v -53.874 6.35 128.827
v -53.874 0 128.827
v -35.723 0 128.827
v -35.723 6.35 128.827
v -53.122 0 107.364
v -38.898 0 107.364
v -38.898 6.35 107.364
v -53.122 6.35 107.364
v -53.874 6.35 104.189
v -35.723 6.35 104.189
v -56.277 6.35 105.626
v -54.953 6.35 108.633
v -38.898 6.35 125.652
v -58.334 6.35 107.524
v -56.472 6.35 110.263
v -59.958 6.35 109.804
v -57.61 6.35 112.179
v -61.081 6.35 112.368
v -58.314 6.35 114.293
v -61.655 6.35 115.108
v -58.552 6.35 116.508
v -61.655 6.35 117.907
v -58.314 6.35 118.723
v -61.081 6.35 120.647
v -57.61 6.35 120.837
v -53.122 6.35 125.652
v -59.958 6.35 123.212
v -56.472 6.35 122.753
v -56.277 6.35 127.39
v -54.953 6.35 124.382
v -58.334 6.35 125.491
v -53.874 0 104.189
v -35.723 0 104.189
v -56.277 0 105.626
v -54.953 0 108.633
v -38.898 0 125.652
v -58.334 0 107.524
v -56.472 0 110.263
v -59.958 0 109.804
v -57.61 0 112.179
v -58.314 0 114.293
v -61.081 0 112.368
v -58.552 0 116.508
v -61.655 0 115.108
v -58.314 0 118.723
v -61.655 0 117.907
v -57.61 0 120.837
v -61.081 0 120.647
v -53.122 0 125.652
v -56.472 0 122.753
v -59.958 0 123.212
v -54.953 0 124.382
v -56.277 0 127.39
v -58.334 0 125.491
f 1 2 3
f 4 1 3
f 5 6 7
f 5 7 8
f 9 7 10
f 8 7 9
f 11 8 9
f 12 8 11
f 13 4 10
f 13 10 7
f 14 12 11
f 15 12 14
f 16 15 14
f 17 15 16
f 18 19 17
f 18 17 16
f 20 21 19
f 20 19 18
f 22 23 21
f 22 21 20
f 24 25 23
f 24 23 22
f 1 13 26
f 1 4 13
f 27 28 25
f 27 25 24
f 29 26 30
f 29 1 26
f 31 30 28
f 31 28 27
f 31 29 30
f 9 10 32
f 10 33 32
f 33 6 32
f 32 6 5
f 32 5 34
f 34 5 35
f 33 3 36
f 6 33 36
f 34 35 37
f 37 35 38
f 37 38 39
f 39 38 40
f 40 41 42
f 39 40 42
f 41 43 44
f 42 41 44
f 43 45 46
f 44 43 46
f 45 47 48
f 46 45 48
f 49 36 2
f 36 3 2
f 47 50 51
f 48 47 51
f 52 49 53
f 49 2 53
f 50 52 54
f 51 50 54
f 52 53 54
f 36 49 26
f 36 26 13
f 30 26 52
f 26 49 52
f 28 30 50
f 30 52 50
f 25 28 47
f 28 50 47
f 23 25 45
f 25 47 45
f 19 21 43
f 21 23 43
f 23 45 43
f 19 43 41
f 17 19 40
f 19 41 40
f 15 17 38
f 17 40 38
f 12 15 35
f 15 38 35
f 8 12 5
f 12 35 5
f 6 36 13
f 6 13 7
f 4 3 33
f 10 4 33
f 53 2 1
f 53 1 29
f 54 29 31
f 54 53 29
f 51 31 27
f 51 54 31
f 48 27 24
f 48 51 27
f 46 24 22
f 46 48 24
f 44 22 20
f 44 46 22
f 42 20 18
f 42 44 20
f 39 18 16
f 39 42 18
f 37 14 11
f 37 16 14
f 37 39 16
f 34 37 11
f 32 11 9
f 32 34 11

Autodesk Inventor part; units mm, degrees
ref_plane "YZ Plane" through (0, 0, 0) normal (1, 0, 0) x (0, 1, 0)
ref_plane "XZ Plane" through (0, 0, 0) normal (0, 1, 0) x (-1, 0, 0)
ref_plane "XY Plane" through (0, 0, 0) normal (0, 0, 1) x (1, 0, 0)
sketch "Sketch1" plane through (0, 0, 0) normal (0, 1, 0) x (-1, 0, 0)
  line L0 (53.122, 125.6518) -> (38.898, 125.6518)
  line L1 (38.898, 125.6518) -> (38.898, 107.3638)
  line L2 (38.898, 107.3638) -> (53.122, 107.3638)
  arc A0 (53.122, 107.3638) -> (53.122, 125.6518) centre (48.1382, 116.5078) ccw
  line L3 (51.0559, 55.1199) -> (37.0859, 55.1199)
  line L4 (37.0859, 55.1199) -> (37.0859, 37.0859)
  line L5 (37.0859, 37.0859) -> (51.0559, 37.0859)
  arc A1 (51.0559, 37.0859) -> (51.0559, 55.1199) centre (39.6314, 46.1029) ccw
  line L6 (61.7452, 17.3999) -> (47.7752, 17.3999)
  line L7 (47.7752, 17.3999) -> (47.7752, -0.6341)
  line L8 (47.7752, -0.6341) -> (61.7452, -0.6341)
  arc A2 (61.7452, -0.6341) -> (61.7452, 17.3999) centre (49.459, 8.3829) ccw
  line L9 (89.1373, 73.7746) -> (75.1673, 73.7746)
  line L10 (75.1673, 73.7746) -> (75.1673, 55.7406)
  line L11 (75.1673, 55.7406) -> (89.1373, 55.7406)
  arc A3 (89.1373, 55.7406) -> (89.1373, 73.7746) centre (83.9272, 64.7576) ccw
  line L12 (52.5031, 58.2949) -> (33.9109, 58.2949)
  line L13 (33.9109, 58.2949) -> (33.9109, 33.9109)
  line L14 (33.9109, 33.9109) -> (52.5031, 33.9109)
  arc A4 (52.5031, 33.9109) -> (52.5031, 58.2949) centre (39.6314, 46.1029) ccw
  line L15 (53.8743, 128.8268) -> (35.723, 128.8268)
  line L16 (35.723, 128.8268) -> (35.723, 104.1888)
  line L17 (35.723, 104.1888) -> (53.8743, 104.1888)
  arc A5 (53.8743, 104.1888) -> (53.8743, 128.8268) centre (48.1382, 116.5078) ccw
  line L18 (63.26, 20.5749) -> (44.6002, 20.5749)
  line L19 (44.6002, 20.5749) -> (44.6002, -3.8091)
  line L20 (44.6002, -3.8091) -> (63.26, -3.8091)
  arc A6 (63.26, -3.8091) -> (63.26, 20.5749) centre (49.459, 8.3829) ccw
  line L21 (89.9285, 52.5656) -> (71.9923, 52.5656)
  line L22 (71.9923, 52.5656) -> (71.9923, 76.9496)
  line L23 (71.9923, 76.9496) -> (89.9285, 76.9496)
  arc A7 (89.9285, 52.5656) -> (89.9285, 76.9496) centre (83.9272, 64.7576) ccw
  point P0 (0, 0)
  dimension "d0" = 10.414
  dimension "d1" = 14.224
  dimension "d2" = 18.288
  dimension "d3" = 14.5542
  dimension "d4" = 13.97
  dimension "d5" = 18.034
  dimension "d6" = 15.24
  dimension "d7" = 13.97
  dimension "d8" = 18.034
  dimension "d10" = 13.97
  dimension "d11" = 18.034
  dimension "d13" = 3.175
  dimension "d14" = 3.175
  dimension "d15" = 3.175
  dimension "d19" = 10.414
  dimension "d20" = 3.175
extrude "Extrusion2" add sketch "Sketch1" along normal blind 6.35 contours A5 L17 L16 L15
properties part number "truck_sizings"
